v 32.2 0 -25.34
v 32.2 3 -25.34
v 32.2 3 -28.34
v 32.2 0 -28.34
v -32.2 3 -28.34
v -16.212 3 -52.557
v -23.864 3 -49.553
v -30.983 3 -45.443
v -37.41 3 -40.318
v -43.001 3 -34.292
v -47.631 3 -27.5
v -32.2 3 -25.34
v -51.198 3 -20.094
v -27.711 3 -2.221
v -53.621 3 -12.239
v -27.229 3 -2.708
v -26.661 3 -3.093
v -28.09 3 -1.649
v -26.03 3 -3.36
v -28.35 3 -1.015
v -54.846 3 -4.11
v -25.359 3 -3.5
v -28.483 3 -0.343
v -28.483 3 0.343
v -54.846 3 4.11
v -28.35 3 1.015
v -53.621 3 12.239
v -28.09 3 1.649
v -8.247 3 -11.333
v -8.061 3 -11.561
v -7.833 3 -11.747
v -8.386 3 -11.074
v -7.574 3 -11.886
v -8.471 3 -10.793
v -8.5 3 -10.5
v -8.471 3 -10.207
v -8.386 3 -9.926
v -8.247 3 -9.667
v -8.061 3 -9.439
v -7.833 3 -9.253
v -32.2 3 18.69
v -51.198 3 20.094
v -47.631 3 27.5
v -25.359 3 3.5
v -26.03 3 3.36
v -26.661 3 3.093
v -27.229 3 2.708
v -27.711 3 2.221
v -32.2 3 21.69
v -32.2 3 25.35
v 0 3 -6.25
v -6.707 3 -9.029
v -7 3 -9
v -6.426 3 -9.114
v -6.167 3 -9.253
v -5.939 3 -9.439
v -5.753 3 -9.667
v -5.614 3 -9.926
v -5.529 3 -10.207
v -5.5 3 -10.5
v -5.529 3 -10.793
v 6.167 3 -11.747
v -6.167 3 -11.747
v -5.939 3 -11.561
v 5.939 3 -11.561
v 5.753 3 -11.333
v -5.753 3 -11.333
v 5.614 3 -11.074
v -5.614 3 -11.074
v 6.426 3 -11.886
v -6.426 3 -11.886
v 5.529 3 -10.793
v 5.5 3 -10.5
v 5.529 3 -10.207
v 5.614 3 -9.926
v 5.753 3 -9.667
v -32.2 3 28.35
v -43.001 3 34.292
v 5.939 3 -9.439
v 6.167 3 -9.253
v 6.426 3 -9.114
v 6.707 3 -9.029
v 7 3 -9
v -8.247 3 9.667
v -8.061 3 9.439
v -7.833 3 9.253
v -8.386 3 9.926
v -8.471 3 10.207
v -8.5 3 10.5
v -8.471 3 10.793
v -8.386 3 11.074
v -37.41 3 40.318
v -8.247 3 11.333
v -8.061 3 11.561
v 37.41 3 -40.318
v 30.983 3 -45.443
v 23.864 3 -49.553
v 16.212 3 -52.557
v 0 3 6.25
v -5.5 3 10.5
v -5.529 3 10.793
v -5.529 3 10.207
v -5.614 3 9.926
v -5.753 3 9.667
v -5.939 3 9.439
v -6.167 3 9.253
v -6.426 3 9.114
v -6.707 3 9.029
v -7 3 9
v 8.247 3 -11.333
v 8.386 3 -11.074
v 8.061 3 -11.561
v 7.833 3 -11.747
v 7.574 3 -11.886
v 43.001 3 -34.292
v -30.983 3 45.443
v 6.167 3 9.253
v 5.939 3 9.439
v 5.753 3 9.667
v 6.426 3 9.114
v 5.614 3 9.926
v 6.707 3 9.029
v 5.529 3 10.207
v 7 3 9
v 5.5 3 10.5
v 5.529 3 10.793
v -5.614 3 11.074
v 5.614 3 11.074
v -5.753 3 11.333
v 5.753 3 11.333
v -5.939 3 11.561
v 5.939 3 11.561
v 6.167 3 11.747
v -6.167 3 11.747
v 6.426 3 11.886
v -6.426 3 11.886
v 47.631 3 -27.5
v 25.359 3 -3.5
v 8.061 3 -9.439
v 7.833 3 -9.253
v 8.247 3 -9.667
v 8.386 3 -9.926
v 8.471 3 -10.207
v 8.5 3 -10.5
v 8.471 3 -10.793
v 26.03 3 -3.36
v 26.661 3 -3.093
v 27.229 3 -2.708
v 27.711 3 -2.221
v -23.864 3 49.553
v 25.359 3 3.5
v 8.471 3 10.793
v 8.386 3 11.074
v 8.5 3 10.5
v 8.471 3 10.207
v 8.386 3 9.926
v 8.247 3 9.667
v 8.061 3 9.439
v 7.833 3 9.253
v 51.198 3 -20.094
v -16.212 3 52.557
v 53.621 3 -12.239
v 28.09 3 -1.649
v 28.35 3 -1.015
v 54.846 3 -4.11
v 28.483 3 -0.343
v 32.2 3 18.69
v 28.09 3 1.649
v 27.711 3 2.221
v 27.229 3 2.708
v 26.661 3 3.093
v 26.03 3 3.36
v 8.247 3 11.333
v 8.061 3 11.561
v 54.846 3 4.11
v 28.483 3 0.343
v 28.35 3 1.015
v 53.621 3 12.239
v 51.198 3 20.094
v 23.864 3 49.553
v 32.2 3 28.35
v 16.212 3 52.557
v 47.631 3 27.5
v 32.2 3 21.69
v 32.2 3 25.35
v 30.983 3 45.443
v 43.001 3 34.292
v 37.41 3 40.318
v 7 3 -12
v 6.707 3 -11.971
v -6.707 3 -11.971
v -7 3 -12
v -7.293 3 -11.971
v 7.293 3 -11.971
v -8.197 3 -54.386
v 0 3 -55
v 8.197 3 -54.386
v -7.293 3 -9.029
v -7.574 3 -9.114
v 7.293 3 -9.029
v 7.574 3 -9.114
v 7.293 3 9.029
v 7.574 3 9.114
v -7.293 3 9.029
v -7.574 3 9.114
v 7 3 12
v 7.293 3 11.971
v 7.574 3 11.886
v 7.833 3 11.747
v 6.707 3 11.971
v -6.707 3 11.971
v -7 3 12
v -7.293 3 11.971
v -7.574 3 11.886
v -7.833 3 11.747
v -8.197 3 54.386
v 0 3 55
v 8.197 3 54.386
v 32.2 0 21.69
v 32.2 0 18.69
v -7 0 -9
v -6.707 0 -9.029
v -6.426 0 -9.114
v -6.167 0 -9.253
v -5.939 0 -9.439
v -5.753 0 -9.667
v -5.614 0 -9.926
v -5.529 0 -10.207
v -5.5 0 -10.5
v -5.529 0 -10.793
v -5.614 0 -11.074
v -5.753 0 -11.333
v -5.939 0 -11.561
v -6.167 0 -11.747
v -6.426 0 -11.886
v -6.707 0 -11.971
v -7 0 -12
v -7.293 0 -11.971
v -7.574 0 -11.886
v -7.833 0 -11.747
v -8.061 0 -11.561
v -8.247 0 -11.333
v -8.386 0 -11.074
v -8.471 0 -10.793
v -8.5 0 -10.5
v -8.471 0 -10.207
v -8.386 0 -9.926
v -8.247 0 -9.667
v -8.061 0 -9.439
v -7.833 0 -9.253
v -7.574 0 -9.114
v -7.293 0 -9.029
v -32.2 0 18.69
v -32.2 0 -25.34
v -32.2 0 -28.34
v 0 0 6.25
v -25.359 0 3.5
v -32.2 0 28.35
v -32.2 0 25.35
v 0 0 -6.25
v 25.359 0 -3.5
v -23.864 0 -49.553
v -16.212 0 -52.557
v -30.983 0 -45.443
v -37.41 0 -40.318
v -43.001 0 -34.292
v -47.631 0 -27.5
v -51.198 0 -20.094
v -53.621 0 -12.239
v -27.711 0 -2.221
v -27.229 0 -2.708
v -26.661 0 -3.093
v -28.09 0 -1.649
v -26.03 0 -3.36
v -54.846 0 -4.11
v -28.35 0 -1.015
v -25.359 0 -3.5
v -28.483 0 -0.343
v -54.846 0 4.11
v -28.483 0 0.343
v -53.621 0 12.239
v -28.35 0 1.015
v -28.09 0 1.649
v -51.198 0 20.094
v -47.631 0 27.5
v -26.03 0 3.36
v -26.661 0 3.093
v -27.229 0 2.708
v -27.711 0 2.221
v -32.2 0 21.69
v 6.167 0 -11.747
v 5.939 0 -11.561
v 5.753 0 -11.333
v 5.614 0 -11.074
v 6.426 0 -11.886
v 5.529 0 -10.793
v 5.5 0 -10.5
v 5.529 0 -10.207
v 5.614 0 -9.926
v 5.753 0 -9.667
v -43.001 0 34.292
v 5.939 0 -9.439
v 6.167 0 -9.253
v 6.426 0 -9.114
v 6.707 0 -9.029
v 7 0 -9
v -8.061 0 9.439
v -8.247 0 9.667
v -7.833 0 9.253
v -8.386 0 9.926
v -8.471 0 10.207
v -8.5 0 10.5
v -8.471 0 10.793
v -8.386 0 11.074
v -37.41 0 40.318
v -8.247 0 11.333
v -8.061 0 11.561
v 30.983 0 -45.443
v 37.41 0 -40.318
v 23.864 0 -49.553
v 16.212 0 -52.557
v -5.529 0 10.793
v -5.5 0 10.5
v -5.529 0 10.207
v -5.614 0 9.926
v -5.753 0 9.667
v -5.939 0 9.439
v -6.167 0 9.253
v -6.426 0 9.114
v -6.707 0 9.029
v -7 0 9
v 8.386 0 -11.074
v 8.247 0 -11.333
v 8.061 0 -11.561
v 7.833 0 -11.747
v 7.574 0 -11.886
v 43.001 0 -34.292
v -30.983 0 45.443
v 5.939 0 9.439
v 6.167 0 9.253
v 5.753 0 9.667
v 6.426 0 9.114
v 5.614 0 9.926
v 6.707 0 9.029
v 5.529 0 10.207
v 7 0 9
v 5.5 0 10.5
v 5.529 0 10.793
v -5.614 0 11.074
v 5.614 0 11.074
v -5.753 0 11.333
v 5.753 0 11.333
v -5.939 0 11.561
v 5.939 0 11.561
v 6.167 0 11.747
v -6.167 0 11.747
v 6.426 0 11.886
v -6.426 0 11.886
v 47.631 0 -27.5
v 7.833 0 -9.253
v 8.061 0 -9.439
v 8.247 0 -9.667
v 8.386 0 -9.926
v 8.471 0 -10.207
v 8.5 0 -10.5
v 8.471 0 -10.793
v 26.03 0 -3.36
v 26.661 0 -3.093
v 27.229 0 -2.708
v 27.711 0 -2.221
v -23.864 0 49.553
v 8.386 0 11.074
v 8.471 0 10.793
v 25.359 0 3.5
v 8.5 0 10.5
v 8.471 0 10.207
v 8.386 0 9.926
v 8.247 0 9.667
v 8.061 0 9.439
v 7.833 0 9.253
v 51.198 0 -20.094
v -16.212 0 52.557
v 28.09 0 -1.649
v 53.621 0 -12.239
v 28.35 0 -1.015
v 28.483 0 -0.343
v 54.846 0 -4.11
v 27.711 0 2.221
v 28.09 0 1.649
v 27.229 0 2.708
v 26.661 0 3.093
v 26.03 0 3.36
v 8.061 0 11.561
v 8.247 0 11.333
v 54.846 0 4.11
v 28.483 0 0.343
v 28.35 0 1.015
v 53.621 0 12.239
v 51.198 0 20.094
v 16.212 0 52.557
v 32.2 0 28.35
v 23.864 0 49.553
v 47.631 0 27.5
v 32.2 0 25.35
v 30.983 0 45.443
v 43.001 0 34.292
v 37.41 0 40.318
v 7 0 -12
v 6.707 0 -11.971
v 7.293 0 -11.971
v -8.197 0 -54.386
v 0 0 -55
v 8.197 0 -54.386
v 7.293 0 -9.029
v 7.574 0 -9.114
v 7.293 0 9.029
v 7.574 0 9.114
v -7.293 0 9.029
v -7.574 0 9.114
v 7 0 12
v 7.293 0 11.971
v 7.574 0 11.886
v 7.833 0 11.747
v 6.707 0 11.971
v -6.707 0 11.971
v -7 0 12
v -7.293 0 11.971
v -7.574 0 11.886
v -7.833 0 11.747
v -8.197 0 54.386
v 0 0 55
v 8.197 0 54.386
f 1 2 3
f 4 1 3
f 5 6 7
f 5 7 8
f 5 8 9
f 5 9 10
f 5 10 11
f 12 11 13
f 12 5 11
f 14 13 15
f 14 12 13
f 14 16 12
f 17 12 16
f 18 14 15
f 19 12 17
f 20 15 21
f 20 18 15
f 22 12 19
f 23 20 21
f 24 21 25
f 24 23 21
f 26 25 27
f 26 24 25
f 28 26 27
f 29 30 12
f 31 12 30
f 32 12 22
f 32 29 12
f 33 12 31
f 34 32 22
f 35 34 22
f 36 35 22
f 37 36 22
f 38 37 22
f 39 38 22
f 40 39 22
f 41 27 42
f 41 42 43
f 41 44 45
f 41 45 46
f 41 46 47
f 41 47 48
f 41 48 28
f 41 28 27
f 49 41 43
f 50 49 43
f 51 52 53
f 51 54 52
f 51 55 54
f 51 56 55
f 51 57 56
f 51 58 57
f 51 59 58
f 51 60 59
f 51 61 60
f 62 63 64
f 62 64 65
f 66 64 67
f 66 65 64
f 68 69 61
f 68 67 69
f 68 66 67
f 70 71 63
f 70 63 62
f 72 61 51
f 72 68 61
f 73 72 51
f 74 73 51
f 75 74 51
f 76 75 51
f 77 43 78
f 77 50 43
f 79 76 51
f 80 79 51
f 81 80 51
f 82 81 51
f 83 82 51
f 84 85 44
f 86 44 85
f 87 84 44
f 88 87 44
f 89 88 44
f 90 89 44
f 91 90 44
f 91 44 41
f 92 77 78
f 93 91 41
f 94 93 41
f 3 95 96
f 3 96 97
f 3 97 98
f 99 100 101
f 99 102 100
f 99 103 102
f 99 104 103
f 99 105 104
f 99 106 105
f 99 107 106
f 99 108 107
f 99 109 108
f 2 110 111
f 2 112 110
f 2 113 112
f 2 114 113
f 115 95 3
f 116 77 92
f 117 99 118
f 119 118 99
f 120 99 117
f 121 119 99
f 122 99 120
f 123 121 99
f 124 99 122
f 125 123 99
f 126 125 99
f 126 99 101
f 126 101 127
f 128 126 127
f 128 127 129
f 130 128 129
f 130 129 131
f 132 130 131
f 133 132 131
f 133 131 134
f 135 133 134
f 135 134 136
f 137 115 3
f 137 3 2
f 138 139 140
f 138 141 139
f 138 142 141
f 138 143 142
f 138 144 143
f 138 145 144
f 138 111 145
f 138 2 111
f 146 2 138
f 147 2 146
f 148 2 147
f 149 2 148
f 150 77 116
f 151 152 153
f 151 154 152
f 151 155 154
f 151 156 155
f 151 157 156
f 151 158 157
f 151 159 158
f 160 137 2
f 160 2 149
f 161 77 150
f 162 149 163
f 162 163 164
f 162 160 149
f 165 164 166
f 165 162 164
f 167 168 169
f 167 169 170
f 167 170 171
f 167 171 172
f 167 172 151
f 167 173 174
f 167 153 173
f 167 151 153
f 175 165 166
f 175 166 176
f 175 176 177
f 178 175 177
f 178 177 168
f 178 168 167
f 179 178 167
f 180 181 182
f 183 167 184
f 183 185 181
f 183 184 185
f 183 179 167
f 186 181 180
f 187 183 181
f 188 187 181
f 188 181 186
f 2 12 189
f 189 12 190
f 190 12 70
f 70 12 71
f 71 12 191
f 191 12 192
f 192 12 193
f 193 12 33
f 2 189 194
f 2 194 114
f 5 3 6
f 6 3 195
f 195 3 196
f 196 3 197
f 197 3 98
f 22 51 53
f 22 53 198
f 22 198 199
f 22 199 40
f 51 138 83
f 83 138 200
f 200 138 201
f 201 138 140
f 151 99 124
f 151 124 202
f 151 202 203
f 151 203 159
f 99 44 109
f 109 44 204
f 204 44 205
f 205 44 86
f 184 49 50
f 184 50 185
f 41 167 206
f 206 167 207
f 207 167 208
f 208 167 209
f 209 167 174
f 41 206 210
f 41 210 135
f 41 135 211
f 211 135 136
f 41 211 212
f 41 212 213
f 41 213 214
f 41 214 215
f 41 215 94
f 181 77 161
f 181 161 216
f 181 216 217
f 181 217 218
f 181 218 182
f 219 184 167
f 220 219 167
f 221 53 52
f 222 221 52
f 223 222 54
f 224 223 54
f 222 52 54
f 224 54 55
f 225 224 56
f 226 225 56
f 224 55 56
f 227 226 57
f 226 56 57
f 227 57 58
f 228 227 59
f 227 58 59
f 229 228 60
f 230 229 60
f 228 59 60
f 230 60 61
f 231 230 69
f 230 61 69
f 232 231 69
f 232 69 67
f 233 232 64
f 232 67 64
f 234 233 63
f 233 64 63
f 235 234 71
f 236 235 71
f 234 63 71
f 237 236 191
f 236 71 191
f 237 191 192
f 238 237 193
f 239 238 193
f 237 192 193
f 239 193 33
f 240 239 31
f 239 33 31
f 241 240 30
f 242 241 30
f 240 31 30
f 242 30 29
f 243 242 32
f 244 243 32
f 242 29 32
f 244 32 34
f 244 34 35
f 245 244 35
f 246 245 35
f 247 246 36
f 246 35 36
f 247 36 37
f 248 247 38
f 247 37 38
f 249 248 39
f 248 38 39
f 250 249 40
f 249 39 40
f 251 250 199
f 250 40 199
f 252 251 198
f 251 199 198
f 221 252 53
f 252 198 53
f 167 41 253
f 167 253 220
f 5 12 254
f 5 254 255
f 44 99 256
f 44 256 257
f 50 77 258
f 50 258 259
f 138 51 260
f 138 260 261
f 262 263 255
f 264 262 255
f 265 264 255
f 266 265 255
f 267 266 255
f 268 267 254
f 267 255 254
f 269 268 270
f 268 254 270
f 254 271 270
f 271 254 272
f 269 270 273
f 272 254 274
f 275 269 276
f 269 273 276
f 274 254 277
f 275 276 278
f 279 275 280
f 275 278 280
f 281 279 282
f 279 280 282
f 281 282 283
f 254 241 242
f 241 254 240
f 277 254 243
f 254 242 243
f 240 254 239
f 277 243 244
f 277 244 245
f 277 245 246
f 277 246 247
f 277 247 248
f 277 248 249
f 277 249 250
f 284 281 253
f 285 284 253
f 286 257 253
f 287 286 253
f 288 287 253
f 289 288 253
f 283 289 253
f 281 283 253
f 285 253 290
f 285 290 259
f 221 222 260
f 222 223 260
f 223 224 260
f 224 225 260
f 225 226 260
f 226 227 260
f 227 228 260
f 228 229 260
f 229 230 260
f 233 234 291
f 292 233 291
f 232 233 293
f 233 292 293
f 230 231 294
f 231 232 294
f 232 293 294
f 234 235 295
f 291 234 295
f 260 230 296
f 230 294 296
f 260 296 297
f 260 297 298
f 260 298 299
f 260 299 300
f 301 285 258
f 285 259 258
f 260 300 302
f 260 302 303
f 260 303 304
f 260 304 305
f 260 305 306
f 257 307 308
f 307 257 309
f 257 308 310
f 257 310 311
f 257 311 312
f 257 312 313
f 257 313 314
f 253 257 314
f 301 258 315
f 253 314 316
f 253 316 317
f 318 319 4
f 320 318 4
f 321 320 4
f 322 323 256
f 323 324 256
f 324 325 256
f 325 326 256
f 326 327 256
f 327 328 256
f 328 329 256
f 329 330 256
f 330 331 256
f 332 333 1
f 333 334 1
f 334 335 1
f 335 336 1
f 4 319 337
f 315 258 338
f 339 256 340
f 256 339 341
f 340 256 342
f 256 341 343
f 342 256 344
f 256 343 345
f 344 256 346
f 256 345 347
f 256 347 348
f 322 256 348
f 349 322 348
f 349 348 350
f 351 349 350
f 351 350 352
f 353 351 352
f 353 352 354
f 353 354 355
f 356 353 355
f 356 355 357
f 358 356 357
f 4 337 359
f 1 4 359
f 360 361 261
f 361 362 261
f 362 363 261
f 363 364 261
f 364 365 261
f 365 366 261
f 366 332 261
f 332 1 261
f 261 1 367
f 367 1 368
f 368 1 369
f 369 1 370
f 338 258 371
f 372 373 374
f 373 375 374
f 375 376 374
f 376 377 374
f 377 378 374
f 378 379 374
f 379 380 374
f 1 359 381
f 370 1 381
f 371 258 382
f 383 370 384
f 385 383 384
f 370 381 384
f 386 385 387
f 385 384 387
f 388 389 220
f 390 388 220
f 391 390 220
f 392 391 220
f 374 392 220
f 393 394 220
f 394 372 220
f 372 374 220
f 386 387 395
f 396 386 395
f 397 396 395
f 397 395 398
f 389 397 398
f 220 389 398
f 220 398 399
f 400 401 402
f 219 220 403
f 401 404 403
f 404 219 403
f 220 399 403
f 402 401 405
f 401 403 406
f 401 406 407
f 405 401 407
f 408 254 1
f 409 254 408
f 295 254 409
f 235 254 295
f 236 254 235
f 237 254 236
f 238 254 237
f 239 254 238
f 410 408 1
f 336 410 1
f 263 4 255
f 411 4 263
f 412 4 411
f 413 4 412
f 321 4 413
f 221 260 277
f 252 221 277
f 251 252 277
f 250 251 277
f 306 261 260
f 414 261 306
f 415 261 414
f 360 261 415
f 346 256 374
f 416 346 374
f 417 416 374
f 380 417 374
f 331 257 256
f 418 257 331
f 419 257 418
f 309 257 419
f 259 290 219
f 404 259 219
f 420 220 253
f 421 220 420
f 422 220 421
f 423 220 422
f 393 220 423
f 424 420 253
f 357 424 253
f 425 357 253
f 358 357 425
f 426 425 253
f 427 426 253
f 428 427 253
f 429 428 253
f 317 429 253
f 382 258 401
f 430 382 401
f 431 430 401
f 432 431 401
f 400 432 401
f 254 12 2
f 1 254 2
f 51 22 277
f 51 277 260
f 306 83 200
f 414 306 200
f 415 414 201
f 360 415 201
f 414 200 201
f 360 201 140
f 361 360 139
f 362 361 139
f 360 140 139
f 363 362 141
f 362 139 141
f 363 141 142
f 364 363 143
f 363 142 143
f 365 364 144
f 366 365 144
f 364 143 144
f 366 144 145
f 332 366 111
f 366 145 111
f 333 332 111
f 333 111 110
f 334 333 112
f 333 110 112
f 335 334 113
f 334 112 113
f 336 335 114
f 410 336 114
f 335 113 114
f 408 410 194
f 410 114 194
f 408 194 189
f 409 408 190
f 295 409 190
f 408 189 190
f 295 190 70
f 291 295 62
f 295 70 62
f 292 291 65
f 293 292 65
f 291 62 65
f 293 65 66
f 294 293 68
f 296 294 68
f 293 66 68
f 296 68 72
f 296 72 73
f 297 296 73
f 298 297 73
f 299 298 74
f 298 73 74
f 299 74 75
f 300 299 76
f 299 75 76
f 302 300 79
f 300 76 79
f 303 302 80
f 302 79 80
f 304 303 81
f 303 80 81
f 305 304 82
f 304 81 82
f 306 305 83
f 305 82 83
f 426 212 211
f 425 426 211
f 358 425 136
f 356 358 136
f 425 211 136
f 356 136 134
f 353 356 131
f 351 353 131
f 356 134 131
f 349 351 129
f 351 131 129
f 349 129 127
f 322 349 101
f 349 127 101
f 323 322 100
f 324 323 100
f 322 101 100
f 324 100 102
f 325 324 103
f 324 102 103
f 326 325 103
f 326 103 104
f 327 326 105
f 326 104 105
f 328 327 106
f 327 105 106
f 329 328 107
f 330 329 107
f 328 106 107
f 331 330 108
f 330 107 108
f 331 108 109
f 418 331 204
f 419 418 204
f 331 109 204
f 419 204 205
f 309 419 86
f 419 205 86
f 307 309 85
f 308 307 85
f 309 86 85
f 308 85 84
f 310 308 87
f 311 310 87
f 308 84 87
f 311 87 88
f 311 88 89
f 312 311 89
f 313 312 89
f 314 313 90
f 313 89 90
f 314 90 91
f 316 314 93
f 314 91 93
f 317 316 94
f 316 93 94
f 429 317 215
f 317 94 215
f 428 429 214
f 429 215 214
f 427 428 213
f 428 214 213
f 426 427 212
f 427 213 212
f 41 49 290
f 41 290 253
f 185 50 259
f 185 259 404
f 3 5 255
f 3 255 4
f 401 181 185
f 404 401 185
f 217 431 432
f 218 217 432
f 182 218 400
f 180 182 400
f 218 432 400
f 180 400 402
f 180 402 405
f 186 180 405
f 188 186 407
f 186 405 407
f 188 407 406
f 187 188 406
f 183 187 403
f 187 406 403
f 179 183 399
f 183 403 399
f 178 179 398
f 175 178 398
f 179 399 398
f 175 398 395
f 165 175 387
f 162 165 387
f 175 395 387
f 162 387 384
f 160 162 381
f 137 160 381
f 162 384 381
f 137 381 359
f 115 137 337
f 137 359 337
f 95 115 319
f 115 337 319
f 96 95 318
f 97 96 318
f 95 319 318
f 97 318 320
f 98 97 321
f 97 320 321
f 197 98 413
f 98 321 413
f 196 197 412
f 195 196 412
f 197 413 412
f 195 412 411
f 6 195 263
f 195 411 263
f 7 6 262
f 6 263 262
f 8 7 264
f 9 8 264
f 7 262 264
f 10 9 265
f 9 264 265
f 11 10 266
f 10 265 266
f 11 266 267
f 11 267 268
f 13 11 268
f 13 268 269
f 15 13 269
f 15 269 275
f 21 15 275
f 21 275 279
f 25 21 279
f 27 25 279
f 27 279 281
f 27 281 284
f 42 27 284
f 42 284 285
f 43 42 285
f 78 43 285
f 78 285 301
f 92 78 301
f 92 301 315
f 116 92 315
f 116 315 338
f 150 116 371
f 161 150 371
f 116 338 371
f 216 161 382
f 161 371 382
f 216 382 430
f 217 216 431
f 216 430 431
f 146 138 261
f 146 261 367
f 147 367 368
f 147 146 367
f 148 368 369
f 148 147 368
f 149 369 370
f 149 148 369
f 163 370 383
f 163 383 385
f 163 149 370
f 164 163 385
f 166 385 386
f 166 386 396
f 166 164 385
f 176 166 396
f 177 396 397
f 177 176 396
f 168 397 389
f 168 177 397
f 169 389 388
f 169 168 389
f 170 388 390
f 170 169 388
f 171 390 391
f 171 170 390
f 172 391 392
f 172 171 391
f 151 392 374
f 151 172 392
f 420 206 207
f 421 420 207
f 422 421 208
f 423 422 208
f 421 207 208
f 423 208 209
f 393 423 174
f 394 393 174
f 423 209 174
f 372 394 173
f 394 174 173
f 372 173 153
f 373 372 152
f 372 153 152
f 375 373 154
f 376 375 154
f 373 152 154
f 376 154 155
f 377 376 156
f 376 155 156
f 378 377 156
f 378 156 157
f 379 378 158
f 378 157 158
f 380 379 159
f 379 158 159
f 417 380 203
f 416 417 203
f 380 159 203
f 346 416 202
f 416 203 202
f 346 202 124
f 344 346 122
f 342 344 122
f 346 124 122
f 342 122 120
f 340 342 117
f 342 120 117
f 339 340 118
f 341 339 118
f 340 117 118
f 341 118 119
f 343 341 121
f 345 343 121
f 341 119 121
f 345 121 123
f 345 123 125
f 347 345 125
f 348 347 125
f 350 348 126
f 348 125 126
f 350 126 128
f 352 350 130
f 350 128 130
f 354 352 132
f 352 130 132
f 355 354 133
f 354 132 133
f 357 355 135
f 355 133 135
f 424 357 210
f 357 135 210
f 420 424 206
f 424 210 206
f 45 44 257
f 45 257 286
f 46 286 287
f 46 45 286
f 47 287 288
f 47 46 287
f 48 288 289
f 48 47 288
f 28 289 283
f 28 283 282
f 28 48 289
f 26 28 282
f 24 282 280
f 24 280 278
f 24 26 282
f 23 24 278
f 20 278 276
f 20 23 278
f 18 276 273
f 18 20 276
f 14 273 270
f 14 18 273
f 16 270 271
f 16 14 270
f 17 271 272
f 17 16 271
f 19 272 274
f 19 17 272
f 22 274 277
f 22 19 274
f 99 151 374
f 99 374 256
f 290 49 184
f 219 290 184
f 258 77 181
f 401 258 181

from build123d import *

# Parameters (mm, degrees)
SKETCH1_R           = 55
BOSS_EXTRUDE1_DEPTH = 3
CUT_EXTRUDE1_DEPTH  = 3
SKETCH4_R           = 1.5
SKETCH4_W           = 64.4
SKETCH4_H           = 3
CUT_EXTRUDE2_DEPTH  = 3


with BuildPart() as part:
    # Sketch1 → Boss-Extrude1 (new body)
    with BuildSketch(Plane(origin=(0, 0, 0), x_dir=(1, 0, 0), z_dir=(0, 1, 0))):
        with Locations(Location((0, 0, 0), (0, 0, 270))):
            Circle(SKETCH1_R)
    extrude(amount=BOSS_EXTRUDE1_DEPTH)

    # Sketch3 → Cut-Extrude1 (cut)
    with BuildSketch(Plane(origin=(0, 3, 0), x_dir=(1, 0, 0), z_dir=(0, 1, 0))):
        with BuildLine():
            Line((-25.359029713, 3.5), (0, 6.25))
            Line((0, 6.25), (25.359029713, 3.5))
            ThreePointArc((25.359029713, 3.5), (28.5, 0), (25.359029713, -3.5))
            Line((25.359029713, -3.5), (0, -6.25))
            Line((0, -6.25), (-25.359029713, -3.5))
            ThreePointArc((-25.359029713, -3.5), (-28.5, 0), (-25.359029713, 3.5))
        make_face()
    extrude(amount=-CUT_EXTRUDE1_DEPTH, mode=Mode.SUBTRACT)

    # Sketch4 → Cut-Extrude2 (cut)
    with BuildSketch(Plane(origin=(0, 3, 0), x_dir=(1, 0, 0), z_dir=(0, 1, 0))):
        with Locations(Location((-7, -10.5, 0), (0, 0, 270))):
            Circle(SKETCH4_R)
        with Locations(Location((7, -10.5, 0), (0, 0, 270))):
            Circle(SKETCH4_R)
        with Locations(Location((-7, 10.5, 0), (0, 0, 270))):
            Circle(SKETCH4_R)
        with Locations(Location((7, 10.5, 0), (0, 0, 270))):
            Circle(SKETCH4_R)
        with Locations((0, -20.19)):
            Rectangle(SKETCH4_W, SKETCH4_H)
        with Locations((0, -26.85)):
            Rectangle(SKETCH4_W, SKETCH4_H)
        with Locations((0, 26.84)):
            Rectangle(SKETCH4_W, SKETCH4_H)
    extrude(amount=-CUT_EXTRUDE2_DEPTH, mode=Mode.SUBTRACT)


solid = part.part
